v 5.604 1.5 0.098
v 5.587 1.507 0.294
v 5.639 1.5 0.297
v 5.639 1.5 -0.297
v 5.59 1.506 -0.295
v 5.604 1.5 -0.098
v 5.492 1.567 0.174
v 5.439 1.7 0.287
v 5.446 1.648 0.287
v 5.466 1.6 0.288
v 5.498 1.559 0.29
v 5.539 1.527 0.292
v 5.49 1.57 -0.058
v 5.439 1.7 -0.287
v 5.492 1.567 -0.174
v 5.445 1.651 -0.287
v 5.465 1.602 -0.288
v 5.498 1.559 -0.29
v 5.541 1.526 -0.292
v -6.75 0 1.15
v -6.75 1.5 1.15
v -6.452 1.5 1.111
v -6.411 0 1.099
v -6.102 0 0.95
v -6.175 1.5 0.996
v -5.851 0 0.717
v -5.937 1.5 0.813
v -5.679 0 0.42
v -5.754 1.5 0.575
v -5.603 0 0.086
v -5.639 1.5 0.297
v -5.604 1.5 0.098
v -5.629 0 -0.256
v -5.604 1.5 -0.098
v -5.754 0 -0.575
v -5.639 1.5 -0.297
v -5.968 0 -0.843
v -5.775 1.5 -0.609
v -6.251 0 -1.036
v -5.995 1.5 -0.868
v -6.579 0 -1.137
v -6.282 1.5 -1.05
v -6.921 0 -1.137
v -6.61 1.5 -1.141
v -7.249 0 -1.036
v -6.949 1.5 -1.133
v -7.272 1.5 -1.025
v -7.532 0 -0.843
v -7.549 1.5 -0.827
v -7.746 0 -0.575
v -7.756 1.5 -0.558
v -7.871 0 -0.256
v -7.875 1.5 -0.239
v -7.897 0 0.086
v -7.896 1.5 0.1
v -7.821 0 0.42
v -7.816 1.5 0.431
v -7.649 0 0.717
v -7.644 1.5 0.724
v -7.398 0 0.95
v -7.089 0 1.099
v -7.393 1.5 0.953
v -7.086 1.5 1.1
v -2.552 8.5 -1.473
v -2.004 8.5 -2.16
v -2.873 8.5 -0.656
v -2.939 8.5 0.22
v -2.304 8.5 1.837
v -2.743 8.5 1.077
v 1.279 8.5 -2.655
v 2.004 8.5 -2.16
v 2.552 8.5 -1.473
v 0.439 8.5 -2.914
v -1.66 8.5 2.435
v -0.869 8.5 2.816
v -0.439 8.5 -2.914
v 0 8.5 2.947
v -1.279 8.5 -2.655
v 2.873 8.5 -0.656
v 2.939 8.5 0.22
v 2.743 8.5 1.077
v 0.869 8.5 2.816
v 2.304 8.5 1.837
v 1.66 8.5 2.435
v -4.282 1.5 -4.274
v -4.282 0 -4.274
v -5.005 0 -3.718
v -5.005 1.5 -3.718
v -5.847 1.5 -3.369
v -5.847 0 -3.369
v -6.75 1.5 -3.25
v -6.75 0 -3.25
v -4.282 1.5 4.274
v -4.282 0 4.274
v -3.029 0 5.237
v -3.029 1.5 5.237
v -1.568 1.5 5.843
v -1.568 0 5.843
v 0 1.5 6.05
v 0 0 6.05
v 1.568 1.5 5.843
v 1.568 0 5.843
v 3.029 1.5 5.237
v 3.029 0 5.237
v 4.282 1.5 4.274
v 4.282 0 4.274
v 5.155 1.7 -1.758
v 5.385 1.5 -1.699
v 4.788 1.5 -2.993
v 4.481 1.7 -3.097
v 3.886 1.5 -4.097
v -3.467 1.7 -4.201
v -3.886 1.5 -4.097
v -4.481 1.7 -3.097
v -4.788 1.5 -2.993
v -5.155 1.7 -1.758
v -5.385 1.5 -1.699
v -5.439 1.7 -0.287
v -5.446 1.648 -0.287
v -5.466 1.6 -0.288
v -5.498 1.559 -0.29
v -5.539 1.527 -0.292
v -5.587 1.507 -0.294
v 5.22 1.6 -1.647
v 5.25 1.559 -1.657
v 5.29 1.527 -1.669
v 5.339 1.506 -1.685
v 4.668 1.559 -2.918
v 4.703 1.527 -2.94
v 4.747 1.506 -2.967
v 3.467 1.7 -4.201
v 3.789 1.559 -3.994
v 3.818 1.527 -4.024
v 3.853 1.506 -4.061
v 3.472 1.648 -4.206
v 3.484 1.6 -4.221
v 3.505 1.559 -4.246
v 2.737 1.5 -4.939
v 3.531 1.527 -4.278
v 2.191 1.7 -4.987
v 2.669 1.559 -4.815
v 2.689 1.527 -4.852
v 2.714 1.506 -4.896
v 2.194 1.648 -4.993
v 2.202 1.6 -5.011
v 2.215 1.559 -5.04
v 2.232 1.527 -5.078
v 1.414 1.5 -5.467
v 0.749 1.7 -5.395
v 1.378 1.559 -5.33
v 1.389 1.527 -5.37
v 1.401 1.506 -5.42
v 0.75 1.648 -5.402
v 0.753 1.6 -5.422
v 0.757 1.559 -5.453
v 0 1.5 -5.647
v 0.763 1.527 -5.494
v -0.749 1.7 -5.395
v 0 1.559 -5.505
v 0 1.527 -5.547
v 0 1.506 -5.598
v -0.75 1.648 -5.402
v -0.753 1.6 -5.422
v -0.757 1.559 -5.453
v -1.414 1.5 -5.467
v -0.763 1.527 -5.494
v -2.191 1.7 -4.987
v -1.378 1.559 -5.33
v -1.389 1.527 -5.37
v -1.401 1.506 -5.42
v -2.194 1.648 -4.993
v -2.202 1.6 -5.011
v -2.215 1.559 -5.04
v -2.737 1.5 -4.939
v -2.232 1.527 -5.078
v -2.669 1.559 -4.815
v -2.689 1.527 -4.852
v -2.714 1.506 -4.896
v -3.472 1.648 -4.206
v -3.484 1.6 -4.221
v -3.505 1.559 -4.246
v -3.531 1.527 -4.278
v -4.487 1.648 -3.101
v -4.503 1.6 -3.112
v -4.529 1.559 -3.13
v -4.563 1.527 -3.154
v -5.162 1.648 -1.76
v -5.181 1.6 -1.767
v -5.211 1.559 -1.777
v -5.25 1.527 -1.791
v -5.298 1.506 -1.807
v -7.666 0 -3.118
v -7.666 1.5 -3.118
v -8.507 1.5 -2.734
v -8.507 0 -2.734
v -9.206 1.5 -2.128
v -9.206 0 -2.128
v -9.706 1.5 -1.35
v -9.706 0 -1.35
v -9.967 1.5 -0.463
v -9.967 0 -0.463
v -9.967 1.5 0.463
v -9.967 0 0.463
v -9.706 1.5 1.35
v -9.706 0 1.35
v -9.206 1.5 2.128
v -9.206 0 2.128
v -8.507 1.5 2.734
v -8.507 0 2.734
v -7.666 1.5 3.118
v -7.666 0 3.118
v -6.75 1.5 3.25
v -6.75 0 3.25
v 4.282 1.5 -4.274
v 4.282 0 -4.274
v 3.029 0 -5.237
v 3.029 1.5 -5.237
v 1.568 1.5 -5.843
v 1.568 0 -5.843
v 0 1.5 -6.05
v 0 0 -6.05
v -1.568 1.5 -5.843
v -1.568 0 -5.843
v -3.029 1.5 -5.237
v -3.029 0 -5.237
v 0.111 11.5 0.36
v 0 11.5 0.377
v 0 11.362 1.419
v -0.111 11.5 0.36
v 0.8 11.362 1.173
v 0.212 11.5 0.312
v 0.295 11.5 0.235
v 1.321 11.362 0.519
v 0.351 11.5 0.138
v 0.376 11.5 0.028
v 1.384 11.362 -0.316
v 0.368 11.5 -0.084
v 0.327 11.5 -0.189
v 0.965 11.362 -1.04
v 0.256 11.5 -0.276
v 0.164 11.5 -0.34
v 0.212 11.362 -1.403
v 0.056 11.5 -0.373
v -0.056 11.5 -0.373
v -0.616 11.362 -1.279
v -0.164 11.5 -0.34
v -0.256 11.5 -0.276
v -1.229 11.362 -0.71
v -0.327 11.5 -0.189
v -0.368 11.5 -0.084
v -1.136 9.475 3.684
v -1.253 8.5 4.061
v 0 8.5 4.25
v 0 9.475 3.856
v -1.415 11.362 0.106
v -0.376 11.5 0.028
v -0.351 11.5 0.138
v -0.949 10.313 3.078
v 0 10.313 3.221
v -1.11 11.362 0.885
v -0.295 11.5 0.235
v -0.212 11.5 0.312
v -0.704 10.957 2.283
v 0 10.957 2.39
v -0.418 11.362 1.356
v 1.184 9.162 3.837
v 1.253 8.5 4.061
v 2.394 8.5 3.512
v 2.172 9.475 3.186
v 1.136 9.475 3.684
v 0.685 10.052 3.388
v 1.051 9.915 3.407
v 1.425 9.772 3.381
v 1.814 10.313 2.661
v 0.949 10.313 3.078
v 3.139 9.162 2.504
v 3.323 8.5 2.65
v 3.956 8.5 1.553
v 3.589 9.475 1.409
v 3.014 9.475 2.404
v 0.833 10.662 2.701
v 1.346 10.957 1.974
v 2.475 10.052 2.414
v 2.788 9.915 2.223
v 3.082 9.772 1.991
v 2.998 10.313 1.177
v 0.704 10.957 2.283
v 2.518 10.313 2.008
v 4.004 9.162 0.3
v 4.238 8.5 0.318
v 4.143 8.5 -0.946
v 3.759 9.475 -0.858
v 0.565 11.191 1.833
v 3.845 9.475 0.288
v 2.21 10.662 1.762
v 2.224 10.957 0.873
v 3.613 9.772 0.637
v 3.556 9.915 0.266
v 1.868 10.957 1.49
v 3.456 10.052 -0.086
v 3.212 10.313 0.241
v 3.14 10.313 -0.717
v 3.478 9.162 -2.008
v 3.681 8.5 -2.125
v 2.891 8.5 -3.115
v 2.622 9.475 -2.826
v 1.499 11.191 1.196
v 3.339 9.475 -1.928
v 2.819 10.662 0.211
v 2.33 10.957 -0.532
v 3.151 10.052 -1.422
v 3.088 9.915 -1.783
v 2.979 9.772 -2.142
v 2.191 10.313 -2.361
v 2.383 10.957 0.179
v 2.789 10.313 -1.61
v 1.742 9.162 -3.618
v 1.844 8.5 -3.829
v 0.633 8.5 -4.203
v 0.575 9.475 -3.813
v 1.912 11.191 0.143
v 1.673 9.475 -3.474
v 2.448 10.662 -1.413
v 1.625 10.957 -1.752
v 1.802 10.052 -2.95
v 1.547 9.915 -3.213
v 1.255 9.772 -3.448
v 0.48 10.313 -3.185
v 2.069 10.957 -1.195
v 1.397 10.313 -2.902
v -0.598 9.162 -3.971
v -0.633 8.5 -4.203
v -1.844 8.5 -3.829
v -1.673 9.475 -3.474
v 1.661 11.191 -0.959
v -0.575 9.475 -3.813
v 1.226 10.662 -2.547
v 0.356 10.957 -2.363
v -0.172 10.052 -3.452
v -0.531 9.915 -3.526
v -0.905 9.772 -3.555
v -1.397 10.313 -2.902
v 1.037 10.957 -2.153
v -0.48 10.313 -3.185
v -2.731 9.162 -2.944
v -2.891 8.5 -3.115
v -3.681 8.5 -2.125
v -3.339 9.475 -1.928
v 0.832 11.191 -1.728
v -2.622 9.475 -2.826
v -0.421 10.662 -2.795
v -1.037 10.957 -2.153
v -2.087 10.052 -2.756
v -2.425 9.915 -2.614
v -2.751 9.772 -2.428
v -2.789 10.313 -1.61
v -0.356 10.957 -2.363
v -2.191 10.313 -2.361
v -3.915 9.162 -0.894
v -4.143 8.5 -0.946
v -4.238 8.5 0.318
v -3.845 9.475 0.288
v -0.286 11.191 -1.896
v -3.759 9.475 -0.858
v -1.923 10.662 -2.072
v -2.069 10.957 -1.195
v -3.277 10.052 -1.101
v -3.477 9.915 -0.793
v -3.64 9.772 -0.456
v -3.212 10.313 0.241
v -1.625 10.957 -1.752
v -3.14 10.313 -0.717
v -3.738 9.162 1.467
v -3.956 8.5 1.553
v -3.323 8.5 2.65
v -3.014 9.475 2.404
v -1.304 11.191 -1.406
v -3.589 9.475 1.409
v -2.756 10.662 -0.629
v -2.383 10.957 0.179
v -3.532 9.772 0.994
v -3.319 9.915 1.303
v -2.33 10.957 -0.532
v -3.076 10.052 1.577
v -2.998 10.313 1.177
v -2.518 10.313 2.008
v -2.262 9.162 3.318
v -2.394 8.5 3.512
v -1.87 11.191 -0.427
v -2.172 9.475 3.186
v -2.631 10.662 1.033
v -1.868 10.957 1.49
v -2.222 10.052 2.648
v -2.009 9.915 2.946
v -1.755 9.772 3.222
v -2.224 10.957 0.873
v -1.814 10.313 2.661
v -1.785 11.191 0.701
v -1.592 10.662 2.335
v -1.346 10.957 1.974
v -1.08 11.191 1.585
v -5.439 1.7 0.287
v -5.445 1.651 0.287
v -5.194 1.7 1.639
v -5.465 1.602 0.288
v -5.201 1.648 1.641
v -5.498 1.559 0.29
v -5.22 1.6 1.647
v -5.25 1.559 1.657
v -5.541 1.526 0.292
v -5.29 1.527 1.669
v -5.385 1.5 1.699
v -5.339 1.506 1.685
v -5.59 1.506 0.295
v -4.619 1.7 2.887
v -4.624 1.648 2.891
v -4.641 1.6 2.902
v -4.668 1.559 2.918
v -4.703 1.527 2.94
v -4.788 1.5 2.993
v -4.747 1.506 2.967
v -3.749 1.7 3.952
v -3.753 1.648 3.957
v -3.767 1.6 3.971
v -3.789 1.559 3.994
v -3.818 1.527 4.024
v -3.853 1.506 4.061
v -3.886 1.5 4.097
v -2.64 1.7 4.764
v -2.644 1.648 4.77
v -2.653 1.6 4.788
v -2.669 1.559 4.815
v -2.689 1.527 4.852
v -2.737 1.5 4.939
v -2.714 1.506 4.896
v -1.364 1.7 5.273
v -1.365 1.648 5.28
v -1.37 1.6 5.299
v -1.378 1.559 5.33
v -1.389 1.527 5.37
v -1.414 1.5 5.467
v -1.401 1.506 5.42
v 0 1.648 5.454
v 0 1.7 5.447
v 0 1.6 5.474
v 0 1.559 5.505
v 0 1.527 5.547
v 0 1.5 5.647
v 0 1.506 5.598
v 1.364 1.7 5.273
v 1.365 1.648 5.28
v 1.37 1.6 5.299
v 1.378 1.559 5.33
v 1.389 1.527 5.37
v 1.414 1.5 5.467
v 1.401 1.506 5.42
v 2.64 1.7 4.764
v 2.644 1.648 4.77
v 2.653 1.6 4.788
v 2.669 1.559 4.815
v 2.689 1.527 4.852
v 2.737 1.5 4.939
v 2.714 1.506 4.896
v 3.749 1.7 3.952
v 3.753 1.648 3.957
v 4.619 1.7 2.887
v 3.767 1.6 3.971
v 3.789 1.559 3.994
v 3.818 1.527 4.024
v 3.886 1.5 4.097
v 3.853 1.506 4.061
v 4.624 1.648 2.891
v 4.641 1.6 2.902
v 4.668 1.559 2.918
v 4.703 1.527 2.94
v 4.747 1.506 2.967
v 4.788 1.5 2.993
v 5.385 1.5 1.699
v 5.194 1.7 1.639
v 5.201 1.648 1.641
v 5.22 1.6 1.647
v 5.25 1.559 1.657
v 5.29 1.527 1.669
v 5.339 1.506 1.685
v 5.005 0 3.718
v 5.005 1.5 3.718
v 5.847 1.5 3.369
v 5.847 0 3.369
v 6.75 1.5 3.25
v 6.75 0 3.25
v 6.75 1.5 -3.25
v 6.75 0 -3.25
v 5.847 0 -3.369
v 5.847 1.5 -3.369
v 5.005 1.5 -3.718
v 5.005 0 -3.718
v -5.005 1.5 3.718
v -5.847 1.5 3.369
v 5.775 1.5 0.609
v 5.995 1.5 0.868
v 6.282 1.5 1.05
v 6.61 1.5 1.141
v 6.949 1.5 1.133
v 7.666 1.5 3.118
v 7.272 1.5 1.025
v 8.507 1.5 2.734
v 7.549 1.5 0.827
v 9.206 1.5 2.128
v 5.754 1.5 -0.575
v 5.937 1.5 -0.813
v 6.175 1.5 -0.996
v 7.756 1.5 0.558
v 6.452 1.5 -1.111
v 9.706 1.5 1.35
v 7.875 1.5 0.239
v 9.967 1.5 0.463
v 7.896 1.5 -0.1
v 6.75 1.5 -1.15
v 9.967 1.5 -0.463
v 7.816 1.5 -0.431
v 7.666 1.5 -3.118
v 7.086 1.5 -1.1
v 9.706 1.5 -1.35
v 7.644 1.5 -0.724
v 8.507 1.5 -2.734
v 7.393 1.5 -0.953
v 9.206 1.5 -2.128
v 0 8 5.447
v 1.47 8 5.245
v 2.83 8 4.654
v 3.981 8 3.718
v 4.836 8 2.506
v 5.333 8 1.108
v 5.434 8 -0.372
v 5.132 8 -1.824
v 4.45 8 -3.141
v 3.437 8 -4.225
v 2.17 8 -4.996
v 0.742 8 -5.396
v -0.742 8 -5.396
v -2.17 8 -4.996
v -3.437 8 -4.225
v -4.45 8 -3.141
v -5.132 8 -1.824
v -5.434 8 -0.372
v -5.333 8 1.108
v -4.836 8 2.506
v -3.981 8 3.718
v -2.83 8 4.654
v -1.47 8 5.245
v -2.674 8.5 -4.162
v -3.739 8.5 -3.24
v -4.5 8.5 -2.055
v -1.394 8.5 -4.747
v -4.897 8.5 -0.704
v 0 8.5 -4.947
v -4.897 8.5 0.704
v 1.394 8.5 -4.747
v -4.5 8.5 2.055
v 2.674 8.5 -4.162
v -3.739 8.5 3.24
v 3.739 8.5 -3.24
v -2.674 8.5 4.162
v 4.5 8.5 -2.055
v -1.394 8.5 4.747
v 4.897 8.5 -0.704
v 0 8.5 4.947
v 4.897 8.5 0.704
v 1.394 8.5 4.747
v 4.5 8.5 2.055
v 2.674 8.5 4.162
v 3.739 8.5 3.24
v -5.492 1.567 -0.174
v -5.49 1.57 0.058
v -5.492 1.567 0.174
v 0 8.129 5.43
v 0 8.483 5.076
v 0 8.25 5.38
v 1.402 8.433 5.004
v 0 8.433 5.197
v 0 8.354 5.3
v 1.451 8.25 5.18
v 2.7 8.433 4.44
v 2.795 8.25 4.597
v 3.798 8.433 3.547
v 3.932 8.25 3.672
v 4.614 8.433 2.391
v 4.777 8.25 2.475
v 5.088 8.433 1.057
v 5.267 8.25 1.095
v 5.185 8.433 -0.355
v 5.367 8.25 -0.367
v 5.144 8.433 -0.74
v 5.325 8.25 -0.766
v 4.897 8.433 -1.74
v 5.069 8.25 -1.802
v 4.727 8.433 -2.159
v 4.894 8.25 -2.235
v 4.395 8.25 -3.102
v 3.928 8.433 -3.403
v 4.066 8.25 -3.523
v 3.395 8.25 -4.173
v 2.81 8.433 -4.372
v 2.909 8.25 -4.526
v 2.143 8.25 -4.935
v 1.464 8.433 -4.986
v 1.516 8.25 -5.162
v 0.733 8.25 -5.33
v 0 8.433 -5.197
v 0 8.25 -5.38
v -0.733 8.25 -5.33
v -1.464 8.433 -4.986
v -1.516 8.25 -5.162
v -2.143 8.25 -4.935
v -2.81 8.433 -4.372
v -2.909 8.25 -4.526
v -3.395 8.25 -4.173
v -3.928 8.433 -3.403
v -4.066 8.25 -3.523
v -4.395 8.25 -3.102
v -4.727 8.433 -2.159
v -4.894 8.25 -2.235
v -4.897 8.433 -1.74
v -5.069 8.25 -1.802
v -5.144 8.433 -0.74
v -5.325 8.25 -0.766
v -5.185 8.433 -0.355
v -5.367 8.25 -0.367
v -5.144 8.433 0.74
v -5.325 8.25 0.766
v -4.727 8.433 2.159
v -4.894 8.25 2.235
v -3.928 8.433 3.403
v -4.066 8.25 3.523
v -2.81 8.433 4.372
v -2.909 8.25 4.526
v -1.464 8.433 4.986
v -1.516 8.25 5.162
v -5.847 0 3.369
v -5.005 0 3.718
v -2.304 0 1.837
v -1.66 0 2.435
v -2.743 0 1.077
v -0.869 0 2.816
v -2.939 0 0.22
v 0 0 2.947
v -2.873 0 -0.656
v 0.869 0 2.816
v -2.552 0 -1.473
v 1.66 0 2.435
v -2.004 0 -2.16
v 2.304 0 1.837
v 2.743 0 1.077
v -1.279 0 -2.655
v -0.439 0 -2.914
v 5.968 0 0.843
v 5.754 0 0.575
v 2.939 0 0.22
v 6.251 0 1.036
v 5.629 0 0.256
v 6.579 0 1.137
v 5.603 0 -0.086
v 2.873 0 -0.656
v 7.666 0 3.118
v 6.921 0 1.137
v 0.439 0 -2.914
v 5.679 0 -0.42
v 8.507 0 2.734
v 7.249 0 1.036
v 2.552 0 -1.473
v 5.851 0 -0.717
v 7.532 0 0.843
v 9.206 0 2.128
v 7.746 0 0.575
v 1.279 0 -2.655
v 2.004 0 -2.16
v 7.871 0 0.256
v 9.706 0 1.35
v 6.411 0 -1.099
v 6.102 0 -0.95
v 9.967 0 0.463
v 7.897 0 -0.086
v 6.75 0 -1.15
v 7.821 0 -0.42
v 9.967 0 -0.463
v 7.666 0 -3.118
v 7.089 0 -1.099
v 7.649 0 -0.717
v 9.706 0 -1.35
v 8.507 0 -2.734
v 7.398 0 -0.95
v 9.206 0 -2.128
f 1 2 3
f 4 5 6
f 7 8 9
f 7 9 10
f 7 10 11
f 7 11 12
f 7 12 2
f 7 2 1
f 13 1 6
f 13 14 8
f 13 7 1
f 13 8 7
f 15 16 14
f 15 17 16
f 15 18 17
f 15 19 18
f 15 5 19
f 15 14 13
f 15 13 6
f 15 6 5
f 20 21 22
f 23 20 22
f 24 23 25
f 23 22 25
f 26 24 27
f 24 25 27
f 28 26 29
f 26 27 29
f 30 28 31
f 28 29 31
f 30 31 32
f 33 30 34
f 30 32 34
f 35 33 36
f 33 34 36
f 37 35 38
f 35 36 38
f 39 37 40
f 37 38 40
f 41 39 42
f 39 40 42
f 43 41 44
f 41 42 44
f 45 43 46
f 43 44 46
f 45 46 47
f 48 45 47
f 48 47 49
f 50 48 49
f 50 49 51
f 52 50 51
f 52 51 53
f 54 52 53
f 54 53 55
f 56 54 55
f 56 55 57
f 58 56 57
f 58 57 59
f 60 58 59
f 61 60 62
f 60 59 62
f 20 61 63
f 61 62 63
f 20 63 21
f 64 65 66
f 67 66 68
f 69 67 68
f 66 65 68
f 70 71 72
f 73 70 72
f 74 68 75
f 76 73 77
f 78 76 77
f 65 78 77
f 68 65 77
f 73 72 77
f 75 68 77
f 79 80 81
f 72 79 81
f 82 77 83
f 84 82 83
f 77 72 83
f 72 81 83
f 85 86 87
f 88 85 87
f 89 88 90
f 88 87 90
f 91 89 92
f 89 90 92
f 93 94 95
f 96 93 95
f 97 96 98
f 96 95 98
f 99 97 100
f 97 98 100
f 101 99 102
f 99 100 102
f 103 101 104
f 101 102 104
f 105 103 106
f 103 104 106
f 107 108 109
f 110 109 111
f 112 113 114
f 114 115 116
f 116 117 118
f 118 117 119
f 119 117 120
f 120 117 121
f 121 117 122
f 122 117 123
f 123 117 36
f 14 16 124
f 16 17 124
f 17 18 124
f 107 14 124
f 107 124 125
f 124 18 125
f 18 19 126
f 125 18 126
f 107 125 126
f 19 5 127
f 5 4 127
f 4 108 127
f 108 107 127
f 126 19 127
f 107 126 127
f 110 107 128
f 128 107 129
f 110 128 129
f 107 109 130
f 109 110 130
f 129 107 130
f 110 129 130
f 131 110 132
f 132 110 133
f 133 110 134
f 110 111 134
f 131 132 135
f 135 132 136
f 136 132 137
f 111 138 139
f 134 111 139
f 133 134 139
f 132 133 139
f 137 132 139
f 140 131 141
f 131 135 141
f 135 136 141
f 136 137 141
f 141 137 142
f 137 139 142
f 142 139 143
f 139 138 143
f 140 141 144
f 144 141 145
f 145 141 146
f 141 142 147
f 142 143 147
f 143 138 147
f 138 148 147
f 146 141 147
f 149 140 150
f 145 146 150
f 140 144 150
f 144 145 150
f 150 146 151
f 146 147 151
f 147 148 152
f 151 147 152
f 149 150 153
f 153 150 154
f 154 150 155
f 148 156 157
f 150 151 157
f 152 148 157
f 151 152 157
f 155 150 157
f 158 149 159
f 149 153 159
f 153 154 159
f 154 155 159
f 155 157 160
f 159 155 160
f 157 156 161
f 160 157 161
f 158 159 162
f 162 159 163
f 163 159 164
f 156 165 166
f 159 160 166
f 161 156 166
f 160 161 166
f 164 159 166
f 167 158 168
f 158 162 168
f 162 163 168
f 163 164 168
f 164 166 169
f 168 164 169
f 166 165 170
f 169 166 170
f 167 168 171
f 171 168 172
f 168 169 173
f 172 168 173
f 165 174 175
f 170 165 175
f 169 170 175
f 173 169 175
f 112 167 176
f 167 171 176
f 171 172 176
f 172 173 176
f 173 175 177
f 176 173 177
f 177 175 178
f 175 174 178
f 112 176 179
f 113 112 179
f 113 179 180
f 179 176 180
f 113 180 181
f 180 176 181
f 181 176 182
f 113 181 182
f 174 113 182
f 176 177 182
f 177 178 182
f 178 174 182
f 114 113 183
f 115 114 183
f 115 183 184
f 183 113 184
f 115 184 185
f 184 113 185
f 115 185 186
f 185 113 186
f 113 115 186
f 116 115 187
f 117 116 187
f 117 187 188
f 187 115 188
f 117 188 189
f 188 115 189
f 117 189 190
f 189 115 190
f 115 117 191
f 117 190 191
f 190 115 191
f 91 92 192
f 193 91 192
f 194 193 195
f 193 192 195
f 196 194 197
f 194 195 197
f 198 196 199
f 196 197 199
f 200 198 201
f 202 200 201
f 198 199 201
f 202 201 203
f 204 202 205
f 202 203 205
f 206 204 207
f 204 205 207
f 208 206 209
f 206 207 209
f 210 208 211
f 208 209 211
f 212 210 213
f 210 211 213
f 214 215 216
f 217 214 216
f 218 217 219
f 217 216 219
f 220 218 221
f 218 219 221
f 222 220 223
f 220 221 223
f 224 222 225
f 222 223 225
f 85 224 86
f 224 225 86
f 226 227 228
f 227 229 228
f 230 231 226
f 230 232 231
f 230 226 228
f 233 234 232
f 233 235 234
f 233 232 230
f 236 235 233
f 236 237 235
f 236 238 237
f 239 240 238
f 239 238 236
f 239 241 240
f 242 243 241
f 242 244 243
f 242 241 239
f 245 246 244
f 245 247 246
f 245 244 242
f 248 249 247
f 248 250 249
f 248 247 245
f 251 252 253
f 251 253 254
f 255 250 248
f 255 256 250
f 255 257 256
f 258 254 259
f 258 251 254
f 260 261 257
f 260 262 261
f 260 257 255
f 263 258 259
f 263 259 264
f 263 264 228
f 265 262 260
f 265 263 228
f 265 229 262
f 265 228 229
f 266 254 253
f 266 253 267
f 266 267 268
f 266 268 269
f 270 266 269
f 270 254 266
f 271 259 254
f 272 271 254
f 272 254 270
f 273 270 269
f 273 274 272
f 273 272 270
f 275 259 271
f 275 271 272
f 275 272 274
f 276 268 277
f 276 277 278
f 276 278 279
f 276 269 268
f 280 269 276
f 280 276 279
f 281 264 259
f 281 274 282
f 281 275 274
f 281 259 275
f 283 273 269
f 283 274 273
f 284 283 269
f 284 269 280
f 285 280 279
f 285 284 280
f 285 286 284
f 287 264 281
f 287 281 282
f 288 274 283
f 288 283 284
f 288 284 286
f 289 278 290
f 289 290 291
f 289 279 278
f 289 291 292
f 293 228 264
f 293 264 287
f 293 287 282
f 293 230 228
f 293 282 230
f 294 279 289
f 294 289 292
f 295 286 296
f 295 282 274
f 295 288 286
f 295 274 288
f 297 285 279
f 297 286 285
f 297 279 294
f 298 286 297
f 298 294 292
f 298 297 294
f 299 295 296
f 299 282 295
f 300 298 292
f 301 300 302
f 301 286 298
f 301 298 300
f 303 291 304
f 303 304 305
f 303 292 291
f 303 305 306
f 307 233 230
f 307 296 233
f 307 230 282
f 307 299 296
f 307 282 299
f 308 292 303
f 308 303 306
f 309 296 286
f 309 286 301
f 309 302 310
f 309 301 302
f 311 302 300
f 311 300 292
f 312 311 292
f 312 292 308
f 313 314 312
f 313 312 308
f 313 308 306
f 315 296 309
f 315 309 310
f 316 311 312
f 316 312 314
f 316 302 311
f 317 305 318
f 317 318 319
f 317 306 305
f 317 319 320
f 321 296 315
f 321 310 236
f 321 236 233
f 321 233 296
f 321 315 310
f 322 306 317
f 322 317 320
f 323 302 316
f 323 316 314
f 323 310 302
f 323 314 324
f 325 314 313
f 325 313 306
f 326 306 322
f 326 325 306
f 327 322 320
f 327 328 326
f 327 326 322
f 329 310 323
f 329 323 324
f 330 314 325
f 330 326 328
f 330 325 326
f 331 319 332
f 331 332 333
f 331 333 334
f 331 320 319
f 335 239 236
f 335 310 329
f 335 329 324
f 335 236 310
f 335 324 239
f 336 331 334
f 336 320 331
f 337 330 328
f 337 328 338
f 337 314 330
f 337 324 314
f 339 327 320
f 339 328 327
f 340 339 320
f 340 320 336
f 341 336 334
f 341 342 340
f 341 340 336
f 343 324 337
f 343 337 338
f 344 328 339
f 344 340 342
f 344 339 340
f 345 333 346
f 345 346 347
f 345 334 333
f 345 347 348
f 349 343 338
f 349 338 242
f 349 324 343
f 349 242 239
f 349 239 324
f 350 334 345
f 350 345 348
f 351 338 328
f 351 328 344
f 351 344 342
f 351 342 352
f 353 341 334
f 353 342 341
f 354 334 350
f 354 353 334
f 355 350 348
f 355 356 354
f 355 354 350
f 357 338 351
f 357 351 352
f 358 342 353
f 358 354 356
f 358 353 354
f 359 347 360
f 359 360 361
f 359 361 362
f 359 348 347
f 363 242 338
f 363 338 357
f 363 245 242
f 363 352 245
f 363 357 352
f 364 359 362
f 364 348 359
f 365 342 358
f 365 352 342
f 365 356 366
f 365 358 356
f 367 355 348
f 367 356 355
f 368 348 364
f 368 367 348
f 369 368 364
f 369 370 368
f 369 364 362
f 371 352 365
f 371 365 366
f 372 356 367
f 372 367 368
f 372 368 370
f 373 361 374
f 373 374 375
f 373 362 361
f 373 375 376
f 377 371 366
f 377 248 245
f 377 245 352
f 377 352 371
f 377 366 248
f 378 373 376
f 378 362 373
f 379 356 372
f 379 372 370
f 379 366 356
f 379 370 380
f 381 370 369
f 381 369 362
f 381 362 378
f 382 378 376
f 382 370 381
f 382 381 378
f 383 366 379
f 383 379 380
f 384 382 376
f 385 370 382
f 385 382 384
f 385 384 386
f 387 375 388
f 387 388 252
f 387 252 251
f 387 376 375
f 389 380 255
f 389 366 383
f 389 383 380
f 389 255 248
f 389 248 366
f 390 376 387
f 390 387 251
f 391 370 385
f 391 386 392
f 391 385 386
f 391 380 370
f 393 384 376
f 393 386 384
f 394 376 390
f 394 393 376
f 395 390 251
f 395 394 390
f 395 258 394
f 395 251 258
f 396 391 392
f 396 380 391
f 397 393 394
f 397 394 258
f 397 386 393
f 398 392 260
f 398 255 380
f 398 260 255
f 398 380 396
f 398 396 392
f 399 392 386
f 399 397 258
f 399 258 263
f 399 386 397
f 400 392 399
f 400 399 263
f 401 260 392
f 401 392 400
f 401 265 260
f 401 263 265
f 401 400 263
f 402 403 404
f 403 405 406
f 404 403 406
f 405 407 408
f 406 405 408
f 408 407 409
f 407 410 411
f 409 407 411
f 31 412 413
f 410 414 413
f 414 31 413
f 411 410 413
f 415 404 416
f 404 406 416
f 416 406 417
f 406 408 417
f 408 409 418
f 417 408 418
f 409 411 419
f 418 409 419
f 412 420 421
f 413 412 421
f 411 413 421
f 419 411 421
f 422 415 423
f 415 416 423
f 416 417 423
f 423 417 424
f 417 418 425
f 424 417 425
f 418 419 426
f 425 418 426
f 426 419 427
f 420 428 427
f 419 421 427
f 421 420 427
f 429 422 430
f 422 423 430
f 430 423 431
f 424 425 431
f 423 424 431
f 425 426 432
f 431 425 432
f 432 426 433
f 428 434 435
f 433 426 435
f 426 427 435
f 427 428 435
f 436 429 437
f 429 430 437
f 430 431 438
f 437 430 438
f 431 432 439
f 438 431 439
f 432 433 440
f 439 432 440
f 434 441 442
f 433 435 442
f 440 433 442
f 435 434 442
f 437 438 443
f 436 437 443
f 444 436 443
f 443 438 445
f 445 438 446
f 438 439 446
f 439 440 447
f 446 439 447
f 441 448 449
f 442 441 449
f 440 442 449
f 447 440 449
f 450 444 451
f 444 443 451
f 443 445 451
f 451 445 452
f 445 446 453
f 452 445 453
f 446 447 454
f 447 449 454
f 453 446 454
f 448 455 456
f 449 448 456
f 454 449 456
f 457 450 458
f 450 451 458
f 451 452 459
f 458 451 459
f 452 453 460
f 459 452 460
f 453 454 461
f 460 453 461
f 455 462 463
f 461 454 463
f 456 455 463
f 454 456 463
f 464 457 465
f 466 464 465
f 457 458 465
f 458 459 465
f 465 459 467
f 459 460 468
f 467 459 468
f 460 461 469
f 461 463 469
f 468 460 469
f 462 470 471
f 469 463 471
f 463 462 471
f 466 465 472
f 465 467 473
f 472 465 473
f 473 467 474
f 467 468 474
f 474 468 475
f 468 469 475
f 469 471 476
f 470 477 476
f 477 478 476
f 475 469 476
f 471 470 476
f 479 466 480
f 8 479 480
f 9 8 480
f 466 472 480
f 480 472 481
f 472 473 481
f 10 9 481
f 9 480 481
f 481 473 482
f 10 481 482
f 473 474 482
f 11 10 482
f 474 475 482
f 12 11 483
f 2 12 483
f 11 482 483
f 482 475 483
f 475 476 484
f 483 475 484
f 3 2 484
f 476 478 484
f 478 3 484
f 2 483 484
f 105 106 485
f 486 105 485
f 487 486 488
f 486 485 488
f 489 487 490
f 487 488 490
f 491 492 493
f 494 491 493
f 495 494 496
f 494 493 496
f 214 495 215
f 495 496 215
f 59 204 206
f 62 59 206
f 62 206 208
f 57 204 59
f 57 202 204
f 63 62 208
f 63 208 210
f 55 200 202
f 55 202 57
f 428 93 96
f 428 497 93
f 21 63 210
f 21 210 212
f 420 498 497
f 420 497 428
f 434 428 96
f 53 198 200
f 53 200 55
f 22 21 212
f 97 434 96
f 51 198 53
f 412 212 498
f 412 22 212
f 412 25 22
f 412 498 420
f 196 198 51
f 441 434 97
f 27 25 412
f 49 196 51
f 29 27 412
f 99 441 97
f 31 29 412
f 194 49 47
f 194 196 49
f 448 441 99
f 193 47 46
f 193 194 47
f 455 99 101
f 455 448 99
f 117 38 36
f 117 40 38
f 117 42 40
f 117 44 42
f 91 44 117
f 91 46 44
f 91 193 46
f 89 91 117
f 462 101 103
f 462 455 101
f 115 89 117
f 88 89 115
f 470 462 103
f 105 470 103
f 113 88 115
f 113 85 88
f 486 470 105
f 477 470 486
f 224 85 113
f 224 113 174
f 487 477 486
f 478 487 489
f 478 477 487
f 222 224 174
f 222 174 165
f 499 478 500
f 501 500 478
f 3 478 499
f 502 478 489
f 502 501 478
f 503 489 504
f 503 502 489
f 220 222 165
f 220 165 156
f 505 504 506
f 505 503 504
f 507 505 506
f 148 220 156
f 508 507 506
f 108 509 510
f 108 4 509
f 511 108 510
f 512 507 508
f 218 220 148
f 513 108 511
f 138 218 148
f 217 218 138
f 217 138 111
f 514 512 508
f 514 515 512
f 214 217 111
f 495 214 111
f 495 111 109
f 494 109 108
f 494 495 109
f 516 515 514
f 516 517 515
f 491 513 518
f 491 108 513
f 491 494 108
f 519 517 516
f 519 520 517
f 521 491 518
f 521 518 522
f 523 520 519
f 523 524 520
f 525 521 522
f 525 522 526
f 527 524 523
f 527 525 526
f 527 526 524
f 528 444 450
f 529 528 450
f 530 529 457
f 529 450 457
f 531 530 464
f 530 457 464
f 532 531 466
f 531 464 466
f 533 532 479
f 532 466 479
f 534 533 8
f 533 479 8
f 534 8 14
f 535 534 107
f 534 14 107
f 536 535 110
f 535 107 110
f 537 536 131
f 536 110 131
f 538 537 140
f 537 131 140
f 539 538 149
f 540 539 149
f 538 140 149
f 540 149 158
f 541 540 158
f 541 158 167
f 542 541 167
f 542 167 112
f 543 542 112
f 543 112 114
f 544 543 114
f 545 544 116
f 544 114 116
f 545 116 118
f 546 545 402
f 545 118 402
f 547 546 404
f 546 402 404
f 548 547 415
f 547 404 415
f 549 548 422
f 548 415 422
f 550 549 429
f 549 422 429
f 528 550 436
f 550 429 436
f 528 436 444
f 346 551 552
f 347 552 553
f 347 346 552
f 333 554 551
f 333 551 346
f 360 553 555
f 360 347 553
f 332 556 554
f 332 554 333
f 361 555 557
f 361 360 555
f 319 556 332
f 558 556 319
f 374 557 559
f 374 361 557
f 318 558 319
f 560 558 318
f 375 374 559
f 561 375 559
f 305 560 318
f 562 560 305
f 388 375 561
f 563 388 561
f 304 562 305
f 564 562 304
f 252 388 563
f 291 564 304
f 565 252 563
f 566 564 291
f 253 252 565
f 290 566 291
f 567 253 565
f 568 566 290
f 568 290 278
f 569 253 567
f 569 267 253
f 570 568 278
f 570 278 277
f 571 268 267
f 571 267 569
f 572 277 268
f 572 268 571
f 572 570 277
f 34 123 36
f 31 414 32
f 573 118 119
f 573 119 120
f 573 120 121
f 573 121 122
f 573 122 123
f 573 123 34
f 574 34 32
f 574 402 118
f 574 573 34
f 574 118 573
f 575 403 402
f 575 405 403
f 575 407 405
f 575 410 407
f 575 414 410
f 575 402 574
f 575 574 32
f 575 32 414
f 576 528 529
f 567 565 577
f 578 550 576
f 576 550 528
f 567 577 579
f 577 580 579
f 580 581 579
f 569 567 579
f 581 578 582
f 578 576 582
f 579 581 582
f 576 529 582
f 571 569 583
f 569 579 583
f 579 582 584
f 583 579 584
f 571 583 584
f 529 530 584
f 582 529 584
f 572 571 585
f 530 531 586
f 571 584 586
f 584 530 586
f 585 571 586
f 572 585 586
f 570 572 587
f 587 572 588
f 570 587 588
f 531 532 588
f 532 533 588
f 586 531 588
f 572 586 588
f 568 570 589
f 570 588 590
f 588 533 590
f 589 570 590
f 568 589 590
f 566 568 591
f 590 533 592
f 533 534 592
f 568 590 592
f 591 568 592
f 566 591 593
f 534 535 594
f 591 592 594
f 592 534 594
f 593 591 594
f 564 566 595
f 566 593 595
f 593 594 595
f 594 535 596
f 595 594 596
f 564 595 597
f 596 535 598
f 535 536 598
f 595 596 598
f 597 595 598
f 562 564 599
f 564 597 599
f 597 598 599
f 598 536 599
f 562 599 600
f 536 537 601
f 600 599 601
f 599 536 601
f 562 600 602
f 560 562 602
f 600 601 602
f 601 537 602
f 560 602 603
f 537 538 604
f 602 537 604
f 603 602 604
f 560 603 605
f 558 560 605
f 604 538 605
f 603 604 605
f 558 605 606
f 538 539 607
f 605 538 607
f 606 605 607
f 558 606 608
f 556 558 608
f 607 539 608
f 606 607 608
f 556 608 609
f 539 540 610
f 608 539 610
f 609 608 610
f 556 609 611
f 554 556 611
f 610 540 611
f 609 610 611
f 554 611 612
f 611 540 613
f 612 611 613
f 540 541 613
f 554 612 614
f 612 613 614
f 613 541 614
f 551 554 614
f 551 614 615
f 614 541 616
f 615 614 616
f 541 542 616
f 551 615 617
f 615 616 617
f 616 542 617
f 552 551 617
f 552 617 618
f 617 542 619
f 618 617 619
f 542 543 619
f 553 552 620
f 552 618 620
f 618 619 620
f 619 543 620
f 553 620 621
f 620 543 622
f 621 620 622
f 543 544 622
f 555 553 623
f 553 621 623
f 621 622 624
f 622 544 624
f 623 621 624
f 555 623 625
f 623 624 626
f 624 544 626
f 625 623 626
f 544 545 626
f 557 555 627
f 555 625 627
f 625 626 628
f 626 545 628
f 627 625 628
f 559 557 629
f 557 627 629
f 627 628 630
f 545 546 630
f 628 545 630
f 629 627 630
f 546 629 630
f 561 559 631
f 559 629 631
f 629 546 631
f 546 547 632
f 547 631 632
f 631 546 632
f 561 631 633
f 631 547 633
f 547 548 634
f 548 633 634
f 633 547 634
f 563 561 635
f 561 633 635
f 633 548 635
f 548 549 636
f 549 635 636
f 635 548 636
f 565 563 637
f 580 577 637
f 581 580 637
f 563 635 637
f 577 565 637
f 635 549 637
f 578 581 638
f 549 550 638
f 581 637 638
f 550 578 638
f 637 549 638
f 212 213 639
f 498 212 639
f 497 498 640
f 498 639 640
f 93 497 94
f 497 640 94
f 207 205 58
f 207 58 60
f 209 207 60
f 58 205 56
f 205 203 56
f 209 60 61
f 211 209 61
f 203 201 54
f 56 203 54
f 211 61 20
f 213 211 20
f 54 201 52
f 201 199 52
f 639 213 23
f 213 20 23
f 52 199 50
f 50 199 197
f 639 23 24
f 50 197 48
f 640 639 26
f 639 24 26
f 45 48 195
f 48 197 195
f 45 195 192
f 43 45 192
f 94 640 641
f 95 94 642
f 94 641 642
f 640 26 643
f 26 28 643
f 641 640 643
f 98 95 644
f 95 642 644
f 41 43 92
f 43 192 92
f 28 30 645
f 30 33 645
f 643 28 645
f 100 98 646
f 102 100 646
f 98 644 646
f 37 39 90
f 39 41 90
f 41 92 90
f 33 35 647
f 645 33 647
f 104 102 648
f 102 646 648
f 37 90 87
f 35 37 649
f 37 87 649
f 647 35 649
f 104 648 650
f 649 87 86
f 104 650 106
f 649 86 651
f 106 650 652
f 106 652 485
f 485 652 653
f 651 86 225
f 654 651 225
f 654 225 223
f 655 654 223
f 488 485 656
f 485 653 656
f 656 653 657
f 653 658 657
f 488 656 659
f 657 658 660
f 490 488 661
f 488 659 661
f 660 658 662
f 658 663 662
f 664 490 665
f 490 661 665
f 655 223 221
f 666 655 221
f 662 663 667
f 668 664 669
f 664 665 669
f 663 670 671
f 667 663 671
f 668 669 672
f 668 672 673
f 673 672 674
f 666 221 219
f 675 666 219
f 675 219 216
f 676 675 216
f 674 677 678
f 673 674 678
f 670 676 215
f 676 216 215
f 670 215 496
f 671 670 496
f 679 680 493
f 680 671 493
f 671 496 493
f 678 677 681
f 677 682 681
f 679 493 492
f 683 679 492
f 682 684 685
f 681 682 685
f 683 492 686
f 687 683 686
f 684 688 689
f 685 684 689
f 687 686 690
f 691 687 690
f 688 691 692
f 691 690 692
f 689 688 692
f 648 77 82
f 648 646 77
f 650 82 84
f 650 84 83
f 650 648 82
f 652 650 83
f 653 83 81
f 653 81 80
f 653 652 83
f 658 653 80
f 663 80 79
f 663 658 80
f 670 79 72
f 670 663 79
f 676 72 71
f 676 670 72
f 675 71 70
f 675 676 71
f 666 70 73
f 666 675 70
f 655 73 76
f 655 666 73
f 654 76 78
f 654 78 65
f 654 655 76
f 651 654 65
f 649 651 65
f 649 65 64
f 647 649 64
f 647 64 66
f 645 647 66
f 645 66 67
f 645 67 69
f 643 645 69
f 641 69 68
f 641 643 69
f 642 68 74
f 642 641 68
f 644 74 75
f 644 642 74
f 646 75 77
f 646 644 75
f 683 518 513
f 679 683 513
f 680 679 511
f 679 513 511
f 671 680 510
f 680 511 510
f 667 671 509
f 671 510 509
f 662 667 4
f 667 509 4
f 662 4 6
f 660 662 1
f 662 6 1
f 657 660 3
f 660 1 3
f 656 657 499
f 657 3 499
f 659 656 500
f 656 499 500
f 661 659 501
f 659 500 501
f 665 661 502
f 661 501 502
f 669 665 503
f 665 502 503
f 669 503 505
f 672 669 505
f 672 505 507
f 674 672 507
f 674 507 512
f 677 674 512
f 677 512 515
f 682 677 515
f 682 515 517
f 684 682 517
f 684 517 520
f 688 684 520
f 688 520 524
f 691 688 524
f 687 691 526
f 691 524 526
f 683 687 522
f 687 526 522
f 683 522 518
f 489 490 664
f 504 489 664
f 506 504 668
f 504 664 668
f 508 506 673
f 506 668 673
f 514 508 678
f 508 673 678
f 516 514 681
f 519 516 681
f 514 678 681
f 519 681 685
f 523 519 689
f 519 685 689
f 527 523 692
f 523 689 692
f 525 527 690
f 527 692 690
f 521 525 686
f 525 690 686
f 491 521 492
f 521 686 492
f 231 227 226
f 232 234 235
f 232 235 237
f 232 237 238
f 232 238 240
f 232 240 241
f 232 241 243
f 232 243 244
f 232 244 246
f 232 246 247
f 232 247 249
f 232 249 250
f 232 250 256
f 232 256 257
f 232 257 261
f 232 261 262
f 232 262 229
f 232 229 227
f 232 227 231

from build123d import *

# Parameters (mm, degrees)
SKETCH1_R           = 2.946896199
BOSS_EXTRUDE1_DEPTH = 1.5
SKETCH2_R           = 1.15
CUT_EXTRUDE1_DEPTH  = 12.783569069
SKETCH3_R           = 5.446896199
SKETCH3_R_2         = 2.946896199
BOSS_EXTRUDE2_DEPTH = 7
SKETCH4_R           = 4.25
BOSS_EXTRUDE3_DEPTH = 3
FILLET1_R           = 4
FILLET2_R           = 0.5
FILLET3_R           = 0.2


with BuildPart() as part:
    # Sketch1 → Boss-Extrude1 (new body)
    with BuildSketch(Plane(origin=(0, 0, 0), x_dir=(1, 0, 0), z_dir=(0, 1, 0))):
        with BuildLine():
            ThreePointArc((-4.282383784, -4.273603764), (0, -6.05), (4.282383784, -4.273603764))
            ThreePointArc((4.282383784, -4.273603764), (5.414251665, -3.516053121), (6.75, -3.25))
            ThreePointArc((6.75, -3.25), (10, 0), (6.75, 3.25))
            ThreePointArc((6.75, 3.25), (5.414251665, 3.516053121), (4.282383784, 4.273603764))
            ThreePointArc((4.282383784, 4.273603764), (0, 6.05), (-4.282383784, 4.273603764))
            ThreePointArc((-4.282383784, 4.273603764), (-5.414251665, 3.516053121), (-6.75, 3.25))
            ThreePointArc((-6.75, 3.25), (-10, 0), (-6.75, -3.25))
            ThreePointArc((-6.75, -3.25), (-5.414251665, -3.516053121), (-4.282383784, -4.273603764))
        make_face()
        with Locations(Location((0, 0, 0), (0, 0, 270))):
            Circle(SKETCH1_R, mode=Mode.SUBTRACT)
    extrude(amount=BOSS_EXTRUDE1_DEPTH)

    # Sketch2 → Cut-Extrude1 (cut, through all)
    with BuildSketch(Plane(origin=(0, 1.5, 0), x_dir=(1, 0, 0), z_dir=(0, 1, 0))):
        with Locations(Location((-6.75, 0, 0), (0, 0, 270))):
            Circle(SKETCH2_R)
        with Locations(Location((6.75, 0, 0), (0, 0, 90))):
            Circle(SKETCH2_R)
    extrude(amount=-CUT_EXTRUDE1_DEPTH, mode=Mode.SUBTRACT)

    # Sketch3 → Boss-Extrude2 (add)
    with BuildSketch(Plane(origin=(0, 1.5, 0), x_dir=(1, 0, 0), z_dir=(0, 1, 0))):
        with Locations(Location((0, 0, 0), (0, 0, 270))):
            Circle(SKETCH3_R)
        with Locations(Location((0, 0, 0), (0, 0, 270))):
            Circle(SKETCH3_R_2, mode=Mode.SUBTRACT)
    extrude(amount=BOSS_EXTRUDE2_DEPTH)

    # Sketch4 → Boss-Extrude3 (add)
    with BuildSketch(Plane(origin=(0, 8.5, 0), x_dir=(1, 0, 0), z_dir=(0, 1, 0))):
        with Locations(Location((0, 0, 0), (0, 0, 270))):
            Circle(SKETCH4_R)
    extrude(amount=BOSS_EXTRUDE3_DEPTH)

    # Fillet1
    # the kernel refuses this fillet: 4 mm, written as the material it takes off along each edge
    with BuildSketch(Plane(origin=(0, 11.5, 0), x_dir=(0, 0, 1), z_dir=(-1, 0, 0))) as fillet1_piece_1:
        with BuildLine():
            CenterArc((0.377016654, -4), FILLET1_R, 14.477512186, 75.522487814)
            Line((0.377016654, 0), (0.377016654, 0.08))
            Line((0.377016654, 0.08), (4.25, 0.08))
            Line((4.25, 0.08), (4.33, 0))
            ThreePointArc((4.33, 0), (4.33, -1.5), (4.327459667, -2.98))
            Line((4.327459667, -2.98), (4.25, -3))
        make_face()
    revolve(axis=Axis((0, 11.5, 0), (0, 1, 0)), mode=Mode.SUBTRACT)

    # Fillet2
    fillet2_edges = [part.edges().sort_by_distance(p)[0] for p in [
        (0, 8.5, -5.446896199),
    ]]
    fillet(fillet2_edges, radius=FILLET2_R)

    # Fillet3
    fillet3_edges = [part.edges().sort_by_distance(p)[0] for p in [
        (0, 1.5, -5.446896199),
    ]]
    fillet(fillet3_edges, radius=FILLET3_R)


solid = part.part
